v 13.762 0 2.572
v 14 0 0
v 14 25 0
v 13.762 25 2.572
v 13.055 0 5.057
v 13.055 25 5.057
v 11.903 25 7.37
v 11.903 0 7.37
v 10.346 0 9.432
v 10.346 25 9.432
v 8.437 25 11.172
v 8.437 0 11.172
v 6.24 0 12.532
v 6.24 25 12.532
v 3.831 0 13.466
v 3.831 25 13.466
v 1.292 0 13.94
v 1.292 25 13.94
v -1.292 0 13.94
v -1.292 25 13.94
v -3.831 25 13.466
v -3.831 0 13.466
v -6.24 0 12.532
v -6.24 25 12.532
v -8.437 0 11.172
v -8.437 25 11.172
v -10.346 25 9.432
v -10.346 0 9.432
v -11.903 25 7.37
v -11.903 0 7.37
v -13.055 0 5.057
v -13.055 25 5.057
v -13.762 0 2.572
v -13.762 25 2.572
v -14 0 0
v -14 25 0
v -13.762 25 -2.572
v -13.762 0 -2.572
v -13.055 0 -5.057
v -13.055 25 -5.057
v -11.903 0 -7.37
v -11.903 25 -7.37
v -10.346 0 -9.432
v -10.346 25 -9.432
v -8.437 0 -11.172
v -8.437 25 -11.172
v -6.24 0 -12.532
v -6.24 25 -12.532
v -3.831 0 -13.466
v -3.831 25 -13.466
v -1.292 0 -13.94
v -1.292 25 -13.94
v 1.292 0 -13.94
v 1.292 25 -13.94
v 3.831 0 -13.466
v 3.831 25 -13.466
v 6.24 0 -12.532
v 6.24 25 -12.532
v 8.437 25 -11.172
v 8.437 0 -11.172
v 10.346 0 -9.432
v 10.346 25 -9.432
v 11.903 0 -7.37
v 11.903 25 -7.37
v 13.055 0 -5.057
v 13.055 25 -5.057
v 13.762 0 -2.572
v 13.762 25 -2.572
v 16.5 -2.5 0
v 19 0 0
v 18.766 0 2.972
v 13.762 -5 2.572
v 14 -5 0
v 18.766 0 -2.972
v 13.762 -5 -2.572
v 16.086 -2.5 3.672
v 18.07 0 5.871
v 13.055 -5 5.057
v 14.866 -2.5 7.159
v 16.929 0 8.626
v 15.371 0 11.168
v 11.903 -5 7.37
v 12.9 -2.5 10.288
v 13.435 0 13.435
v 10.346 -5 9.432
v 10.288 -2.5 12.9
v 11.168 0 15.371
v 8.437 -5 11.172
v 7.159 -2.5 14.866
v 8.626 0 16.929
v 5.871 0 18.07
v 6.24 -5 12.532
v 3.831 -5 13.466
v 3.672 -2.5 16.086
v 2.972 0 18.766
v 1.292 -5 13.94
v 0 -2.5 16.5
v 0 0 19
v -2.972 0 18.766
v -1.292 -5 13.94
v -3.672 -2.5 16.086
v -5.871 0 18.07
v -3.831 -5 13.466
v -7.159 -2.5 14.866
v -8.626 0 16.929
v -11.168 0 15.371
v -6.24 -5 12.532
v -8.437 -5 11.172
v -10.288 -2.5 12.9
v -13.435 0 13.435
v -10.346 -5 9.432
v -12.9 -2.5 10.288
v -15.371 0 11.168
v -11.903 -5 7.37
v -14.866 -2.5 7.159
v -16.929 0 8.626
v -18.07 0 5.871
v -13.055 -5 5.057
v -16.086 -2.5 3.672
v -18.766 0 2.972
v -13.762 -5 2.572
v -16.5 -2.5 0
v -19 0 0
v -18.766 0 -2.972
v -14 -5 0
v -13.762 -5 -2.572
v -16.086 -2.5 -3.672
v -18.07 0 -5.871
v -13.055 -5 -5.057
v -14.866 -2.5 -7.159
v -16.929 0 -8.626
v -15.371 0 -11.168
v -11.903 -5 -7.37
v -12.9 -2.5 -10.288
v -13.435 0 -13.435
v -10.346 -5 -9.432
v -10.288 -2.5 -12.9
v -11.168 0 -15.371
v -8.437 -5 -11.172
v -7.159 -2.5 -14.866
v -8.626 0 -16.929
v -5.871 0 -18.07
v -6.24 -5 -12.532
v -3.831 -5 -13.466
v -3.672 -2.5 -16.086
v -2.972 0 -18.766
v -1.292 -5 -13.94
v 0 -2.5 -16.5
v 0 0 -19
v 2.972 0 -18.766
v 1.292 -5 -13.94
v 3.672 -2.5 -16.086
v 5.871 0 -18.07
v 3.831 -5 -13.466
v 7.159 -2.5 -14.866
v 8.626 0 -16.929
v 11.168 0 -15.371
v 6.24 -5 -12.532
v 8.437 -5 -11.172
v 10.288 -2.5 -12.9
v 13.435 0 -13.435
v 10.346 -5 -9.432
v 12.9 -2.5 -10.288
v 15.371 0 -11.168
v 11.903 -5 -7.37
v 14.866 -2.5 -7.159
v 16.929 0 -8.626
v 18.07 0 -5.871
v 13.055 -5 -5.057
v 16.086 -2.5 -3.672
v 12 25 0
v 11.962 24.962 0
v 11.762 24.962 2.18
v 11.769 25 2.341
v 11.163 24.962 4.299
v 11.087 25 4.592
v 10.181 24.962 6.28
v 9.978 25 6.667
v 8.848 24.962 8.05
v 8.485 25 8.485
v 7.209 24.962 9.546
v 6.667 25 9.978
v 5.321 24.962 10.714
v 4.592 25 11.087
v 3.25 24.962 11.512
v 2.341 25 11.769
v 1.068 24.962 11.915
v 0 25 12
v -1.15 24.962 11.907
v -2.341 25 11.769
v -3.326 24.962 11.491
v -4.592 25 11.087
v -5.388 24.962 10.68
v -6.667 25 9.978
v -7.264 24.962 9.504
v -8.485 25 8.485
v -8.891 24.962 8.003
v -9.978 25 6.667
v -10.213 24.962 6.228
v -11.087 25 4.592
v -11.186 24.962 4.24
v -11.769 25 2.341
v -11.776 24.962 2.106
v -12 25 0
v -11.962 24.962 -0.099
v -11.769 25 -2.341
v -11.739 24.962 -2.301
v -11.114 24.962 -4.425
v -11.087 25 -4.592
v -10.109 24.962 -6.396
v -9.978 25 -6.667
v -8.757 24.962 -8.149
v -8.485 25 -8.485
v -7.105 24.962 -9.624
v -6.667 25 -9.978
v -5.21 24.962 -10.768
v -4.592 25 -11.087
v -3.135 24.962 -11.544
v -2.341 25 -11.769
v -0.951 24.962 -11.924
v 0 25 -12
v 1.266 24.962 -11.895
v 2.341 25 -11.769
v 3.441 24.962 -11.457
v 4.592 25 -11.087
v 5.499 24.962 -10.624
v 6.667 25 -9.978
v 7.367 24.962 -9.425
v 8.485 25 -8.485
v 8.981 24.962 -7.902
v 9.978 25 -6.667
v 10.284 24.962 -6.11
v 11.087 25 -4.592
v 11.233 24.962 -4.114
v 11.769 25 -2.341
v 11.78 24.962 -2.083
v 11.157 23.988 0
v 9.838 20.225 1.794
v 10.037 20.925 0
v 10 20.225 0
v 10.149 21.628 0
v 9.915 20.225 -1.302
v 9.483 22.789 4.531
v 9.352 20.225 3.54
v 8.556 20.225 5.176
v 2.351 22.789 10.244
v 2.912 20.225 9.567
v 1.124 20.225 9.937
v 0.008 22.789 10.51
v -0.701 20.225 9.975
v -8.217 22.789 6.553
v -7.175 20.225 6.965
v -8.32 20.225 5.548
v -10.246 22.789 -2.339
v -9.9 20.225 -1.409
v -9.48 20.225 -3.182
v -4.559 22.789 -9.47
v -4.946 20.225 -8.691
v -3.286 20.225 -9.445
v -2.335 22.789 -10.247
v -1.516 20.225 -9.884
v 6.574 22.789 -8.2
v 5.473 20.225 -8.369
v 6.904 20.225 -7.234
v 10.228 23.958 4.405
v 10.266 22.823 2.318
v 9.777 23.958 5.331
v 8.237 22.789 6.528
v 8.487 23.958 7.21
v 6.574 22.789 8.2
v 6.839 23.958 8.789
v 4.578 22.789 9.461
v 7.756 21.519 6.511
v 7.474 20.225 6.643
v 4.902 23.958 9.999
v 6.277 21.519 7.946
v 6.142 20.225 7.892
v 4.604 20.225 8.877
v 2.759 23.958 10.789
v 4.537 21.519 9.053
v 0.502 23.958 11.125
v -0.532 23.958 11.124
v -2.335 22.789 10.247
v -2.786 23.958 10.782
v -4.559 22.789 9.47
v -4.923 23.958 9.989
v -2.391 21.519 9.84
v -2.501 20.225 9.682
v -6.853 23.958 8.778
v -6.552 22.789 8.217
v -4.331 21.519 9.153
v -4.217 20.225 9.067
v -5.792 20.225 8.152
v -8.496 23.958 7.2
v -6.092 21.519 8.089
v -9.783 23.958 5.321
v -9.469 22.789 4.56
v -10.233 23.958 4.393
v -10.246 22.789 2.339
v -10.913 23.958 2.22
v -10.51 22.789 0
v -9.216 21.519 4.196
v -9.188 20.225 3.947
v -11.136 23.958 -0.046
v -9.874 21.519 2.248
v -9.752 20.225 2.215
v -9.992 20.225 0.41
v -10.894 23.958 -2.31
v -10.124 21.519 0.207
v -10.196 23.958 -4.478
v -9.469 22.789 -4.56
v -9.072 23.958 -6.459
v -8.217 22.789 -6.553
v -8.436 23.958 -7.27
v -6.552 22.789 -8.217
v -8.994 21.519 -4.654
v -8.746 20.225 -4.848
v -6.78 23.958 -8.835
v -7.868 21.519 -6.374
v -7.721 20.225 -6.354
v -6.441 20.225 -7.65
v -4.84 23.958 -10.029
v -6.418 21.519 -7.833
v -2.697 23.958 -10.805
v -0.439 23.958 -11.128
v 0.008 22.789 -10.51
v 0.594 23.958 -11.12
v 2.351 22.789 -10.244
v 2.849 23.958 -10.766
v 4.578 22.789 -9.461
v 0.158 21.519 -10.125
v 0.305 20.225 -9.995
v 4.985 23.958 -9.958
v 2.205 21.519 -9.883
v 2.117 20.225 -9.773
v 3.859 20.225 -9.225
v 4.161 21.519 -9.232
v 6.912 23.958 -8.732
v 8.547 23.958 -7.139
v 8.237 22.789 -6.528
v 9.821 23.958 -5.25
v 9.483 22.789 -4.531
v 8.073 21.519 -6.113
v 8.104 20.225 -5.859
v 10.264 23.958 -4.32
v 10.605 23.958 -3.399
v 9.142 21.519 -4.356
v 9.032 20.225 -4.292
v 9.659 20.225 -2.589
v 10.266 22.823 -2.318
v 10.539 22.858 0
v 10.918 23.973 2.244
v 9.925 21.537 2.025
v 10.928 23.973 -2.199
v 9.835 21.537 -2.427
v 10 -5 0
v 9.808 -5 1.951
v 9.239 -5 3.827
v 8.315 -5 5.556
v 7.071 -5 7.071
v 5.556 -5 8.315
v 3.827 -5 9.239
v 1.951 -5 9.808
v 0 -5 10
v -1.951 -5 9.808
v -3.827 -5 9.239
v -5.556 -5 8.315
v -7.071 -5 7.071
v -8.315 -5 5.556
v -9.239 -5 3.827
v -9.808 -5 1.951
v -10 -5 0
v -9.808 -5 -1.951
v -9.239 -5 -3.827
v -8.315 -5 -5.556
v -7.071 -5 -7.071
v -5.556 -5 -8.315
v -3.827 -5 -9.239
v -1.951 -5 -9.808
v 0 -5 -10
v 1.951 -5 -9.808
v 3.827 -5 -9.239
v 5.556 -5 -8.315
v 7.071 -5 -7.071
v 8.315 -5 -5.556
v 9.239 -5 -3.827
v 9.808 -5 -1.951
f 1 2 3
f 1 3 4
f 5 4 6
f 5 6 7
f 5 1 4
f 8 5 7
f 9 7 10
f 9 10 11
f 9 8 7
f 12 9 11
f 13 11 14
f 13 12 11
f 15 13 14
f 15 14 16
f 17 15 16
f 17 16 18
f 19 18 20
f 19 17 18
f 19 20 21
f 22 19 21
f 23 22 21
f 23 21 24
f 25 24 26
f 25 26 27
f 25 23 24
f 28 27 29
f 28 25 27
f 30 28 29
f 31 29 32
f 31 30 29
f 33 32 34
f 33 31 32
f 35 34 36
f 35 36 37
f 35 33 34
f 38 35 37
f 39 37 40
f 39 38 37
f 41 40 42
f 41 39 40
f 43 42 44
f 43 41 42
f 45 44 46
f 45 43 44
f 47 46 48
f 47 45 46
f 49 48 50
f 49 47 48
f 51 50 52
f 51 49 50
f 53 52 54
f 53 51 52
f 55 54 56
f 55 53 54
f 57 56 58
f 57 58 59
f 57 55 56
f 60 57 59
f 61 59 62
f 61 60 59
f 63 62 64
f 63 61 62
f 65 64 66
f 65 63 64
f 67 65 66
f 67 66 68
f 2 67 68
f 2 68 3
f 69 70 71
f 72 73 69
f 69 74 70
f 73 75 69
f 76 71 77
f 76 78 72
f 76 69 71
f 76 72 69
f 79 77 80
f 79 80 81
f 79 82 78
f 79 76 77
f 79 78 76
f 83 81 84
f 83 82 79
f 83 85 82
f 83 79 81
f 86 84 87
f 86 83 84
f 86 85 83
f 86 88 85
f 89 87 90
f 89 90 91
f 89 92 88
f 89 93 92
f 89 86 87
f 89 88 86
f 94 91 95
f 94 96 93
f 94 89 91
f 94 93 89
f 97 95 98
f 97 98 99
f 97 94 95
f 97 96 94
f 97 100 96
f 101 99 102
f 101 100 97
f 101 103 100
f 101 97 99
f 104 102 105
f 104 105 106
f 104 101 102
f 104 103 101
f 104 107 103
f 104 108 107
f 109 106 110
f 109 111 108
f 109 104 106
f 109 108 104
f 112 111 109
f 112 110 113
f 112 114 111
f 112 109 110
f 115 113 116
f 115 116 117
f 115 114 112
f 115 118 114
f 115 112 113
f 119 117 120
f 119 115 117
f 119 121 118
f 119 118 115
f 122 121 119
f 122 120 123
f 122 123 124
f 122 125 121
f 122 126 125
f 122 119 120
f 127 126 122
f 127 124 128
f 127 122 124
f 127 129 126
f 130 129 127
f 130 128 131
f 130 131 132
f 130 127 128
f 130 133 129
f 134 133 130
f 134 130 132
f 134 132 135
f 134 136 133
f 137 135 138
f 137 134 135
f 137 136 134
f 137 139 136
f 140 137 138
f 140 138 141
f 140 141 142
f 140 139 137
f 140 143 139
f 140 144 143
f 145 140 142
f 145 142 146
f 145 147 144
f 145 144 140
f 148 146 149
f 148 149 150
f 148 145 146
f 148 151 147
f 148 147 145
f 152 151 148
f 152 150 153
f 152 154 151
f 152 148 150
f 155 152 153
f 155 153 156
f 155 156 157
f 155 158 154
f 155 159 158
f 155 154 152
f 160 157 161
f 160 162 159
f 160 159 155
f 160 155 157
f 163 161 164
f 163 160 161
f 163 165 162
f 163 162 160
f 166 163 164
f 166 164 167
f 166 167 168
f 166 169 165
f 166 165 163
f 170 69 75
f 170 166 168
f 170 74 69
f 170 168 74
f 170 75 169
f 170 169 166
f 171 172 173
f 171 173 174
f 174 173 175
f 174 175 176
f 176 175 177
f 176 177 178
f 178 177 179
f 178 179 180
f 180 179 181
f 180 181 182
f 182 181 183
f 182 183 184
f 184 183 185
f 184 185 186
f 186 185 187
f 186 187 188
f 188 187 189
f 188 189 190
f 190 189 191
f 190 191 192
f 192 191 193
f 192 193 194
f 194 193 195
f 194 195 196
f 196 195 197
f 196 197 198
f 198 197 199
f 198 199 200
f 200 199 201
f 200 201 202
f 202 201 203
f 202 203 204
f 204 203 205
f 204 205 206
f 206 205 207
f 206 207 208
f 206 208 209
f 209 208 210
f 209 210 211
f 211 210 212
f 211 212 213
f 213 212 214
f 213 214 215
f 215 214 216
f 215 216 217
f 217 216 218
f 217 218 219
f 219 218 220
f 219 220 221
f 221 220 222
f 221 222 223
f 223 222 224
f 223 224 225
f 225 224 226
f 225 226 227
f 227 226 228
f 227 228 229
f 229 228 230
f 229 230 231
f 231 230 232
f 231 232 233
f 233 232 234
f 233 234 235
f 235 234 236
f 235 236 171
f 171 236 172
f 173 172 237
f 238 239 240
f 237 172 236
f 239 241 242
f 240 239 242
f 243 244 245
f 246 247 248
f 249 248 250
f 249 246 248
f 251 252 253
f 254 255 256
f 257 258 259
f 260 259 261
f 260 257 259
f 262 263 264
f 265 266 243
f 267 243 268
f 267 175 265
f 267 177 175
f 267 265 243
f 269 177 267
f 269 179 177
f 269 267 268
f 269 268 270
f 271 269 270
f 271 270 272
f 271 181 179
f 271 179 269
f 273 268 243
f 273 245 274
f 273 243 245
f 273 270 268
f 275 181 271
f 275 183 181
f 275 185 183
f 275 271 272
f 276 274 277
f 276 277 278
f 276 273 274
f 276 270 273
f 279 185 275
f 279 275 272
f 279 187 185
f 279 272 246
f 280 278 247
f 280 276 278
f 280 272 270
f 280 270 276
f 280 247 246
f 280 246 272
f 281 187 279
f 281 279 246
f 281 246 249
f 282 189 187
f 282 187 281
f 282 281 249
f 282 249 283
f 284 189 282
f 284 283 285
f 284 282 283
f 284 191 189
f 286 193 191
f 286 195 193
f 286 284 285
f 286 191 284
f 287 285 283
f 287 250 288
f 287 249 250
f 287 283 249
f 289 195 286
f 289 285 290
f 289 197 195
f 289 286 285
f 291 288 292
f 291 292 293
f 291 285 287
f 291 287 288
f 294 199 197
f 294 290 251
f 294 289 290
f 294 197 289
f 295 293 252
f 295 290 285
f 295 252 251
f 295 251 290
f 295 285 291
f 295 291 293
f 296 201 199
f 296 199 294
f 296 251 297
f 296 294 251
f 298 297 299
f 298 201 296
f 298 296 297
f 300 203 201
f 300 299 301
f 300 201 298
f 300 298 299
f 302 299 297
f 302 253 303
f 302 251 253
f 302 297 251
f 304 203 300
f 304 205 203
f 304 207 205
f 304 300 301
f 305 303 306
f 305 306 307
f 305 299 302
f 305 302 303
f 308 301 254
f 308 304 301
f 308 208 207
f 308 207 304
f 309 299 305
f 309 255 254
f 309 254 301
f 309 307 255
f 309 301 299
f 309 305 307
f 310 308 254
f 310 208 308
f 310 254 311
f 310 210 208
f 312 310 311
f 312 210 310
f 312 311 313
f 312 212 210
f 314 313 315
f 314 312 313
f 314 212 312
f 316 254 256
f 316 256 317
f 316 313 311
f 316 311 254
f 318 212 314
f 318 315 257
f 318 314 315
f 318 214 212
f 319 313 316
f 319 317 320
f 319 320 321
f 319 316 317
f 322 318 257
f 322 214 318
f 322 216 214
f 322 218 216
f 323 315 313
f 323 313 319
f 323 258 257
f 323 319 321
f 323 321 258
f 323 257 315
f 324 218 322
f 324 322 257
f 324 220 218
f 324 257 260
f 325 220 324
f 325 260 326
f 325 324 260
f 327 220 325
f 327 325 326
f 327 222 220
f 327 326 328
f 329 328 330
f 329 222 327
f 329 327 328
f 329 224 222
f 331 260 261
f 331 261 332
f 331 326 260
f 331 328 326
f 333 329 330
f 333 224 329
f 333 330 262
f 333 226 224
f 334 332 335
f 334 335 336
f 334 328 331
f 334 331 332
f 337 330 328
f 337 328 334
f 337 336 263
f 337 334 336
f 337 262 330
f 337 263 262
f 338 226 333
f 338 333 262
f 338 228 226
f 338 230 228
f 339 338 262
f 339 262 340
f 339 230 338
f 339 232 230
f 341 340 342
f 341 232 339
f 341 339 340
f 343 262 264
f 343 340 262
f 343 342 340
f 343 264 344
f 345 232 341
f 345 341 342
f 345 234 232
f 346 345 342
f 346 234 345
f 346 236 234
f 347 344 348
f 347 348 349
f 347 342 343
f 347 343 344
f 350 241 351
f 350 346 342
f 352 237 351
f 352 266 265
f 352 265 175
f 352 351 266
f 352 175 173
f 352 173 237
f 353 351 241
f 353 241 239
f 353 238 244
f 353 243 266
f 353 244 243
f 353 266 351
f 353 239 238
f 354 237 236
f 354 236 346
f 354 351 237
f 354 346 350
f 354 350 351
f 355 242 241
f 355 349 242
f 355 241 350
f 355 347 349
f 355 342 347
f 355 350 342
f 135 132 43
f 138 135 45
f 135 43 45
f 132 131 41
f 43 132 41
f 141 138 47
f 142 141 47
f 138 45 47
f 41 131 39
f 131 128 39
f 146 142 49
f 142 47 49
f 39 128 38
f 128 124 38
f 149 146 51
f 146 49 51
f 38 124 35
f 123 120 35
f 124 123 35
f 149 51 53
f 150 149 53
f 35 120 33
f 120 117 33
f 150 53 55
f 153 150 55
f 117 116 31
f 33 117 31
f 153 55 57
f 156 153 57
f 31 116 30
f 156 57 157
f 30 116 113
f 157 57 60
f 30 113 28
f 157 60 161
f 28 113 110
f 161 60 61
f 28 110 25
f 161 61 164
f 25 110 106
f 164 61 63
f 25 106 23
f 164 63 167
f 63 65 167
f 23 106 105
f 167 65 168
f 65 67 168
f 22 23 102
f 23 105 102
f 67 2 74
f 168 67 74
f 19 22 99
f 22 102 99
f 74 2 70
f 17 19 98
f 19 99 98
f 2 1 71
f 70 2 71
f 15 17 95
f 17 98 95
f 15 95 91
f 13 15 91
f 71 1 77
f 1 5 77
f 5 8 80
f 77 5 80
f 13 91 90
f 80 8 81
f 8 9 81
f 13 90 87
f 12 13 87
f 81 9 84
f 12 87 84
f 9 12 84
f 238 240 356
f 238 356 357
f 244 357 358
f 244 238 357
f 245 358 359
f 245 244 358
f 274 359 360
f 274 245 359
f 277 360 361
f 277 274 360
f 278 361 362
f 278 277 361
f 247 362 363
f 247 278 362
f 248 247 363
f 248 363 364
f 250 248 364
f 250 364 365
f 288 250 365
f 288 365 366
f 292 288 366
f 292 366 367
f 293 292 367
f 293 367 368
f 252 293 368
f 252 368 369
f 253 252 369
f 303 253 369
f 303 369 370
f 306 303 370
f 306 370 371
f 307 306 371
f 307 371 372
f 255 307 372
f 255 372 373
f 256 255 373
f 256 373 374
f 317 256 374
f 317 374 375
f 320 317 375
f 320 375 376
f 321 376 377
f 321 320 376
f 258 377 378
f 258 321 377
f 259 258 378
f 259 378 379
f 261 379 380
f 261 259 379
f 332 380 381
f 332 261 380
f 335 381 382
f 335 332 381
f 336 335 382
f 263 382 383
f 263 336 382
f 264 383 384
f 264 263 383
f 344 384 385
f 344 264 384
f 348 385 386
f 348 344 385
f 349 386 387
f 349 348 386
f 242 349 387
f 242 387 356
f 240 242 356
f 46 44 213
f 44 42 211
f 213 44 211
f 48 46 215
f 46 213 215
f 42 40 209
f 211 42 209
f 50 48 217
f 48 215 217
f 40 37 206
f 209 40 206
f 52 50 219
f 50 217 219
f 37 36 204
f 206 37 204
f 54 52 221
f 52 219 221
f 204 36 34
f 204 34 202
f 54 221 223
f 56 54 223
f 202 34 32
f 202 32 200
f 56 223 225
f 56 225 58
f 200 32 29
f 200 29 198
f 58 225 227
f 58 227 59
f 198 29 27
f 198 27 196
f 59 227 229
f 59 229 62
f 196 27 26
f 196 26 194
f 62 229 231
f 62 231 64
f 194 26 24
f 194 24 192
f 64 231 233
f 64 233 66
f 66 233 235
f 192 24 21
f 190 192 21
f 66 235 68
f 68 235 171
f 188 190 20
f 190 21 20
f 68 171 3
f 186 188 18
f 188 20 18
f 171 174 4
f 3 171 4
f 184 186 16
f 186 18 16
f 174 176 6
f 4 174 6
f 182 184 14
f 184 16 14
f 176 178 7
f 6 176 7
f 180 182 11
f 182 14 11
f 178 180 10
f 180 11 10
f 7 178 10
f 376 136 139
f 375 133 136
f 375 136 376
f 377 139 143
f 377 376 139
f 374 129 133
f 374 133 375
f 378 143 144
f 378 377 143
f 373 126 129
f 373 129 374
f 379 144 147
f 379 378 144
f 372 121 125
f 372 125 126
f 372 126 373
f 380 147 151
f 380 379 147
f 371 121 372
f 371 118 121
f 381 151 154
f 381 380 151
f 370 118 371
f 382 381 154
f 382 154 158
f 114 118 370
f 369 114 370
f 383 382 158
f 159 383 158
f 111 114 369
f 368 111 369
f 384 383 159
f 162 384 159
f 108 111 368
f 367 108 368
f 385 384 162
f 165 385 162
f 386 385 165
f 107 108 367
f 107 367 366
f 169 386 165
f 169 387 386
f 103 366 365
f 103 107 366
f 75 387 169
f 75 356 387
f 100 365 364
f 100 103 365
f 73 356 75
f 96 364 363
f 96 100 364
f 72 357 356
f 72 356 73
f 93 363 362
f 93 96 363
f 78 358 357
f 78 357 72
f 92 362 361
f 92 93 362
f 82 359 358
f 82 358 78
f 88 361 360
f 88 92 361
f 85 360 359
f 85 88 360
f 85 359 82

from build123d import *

# Parameters (mm, degrees)
F0_R     = 19
F0_R_2   = 14
F0_R_3   = 10
F1_DEPTH = 5
F2_DEPTH = 25
F3_SIZE  = 4.99999
F4_SIZE  = 2
F5_R     = 6.7


# Not quite as in the source:
# - a fillet or chamfer is up to 0.001 mm smaller than in the source, because OpenCascade refuses the exact size


with BuildPart() as f1:
    # F0 (on Front) → F1 (new body)
    with BuildSketch(Plane.XZ):
        Circle(F0_R)
        Circle(F0_R_2, mode=Mode.SUBTRACT)
        Circle(F0_R_2)
        Circle(F0_R_3, mode=Mode.SUBTRACT)
    extrude(amount=F1_DEPTH)

    # F0 (on Front) → F2 (join)
    with BuildSketch(Plane.XZ):
        Circle(F0_R_2)
        Circle(F0_R_3, mode=Mode.SUBTRACT)
    extrude(amount=-F2_DEPTH)

    # F3 (size 5 in the source; OpenCascade refuses exactly that, so slightly less here)
    f3_edges = [f1.edges().sort_by_distance(p)[0] for p in [
        (-19, -5, 0),
    ]]
    chamfer(f3_edges, length=F3_SIZE)

    # F4
    f4_edges = [f1.edges().sort_by_distance(p)[0] for p in [
        (-10, 25, 0),
    ]]
    chamfer(f4_edges, length=F4_SIZE)

    # F5
    f5_edges = [f1.edges().sort_by_distance(p)[0] for p in [
        (-10, 23, 0),
    ]]
    fillet(f5_edges, radius=F5_R)


solid = f1.part
